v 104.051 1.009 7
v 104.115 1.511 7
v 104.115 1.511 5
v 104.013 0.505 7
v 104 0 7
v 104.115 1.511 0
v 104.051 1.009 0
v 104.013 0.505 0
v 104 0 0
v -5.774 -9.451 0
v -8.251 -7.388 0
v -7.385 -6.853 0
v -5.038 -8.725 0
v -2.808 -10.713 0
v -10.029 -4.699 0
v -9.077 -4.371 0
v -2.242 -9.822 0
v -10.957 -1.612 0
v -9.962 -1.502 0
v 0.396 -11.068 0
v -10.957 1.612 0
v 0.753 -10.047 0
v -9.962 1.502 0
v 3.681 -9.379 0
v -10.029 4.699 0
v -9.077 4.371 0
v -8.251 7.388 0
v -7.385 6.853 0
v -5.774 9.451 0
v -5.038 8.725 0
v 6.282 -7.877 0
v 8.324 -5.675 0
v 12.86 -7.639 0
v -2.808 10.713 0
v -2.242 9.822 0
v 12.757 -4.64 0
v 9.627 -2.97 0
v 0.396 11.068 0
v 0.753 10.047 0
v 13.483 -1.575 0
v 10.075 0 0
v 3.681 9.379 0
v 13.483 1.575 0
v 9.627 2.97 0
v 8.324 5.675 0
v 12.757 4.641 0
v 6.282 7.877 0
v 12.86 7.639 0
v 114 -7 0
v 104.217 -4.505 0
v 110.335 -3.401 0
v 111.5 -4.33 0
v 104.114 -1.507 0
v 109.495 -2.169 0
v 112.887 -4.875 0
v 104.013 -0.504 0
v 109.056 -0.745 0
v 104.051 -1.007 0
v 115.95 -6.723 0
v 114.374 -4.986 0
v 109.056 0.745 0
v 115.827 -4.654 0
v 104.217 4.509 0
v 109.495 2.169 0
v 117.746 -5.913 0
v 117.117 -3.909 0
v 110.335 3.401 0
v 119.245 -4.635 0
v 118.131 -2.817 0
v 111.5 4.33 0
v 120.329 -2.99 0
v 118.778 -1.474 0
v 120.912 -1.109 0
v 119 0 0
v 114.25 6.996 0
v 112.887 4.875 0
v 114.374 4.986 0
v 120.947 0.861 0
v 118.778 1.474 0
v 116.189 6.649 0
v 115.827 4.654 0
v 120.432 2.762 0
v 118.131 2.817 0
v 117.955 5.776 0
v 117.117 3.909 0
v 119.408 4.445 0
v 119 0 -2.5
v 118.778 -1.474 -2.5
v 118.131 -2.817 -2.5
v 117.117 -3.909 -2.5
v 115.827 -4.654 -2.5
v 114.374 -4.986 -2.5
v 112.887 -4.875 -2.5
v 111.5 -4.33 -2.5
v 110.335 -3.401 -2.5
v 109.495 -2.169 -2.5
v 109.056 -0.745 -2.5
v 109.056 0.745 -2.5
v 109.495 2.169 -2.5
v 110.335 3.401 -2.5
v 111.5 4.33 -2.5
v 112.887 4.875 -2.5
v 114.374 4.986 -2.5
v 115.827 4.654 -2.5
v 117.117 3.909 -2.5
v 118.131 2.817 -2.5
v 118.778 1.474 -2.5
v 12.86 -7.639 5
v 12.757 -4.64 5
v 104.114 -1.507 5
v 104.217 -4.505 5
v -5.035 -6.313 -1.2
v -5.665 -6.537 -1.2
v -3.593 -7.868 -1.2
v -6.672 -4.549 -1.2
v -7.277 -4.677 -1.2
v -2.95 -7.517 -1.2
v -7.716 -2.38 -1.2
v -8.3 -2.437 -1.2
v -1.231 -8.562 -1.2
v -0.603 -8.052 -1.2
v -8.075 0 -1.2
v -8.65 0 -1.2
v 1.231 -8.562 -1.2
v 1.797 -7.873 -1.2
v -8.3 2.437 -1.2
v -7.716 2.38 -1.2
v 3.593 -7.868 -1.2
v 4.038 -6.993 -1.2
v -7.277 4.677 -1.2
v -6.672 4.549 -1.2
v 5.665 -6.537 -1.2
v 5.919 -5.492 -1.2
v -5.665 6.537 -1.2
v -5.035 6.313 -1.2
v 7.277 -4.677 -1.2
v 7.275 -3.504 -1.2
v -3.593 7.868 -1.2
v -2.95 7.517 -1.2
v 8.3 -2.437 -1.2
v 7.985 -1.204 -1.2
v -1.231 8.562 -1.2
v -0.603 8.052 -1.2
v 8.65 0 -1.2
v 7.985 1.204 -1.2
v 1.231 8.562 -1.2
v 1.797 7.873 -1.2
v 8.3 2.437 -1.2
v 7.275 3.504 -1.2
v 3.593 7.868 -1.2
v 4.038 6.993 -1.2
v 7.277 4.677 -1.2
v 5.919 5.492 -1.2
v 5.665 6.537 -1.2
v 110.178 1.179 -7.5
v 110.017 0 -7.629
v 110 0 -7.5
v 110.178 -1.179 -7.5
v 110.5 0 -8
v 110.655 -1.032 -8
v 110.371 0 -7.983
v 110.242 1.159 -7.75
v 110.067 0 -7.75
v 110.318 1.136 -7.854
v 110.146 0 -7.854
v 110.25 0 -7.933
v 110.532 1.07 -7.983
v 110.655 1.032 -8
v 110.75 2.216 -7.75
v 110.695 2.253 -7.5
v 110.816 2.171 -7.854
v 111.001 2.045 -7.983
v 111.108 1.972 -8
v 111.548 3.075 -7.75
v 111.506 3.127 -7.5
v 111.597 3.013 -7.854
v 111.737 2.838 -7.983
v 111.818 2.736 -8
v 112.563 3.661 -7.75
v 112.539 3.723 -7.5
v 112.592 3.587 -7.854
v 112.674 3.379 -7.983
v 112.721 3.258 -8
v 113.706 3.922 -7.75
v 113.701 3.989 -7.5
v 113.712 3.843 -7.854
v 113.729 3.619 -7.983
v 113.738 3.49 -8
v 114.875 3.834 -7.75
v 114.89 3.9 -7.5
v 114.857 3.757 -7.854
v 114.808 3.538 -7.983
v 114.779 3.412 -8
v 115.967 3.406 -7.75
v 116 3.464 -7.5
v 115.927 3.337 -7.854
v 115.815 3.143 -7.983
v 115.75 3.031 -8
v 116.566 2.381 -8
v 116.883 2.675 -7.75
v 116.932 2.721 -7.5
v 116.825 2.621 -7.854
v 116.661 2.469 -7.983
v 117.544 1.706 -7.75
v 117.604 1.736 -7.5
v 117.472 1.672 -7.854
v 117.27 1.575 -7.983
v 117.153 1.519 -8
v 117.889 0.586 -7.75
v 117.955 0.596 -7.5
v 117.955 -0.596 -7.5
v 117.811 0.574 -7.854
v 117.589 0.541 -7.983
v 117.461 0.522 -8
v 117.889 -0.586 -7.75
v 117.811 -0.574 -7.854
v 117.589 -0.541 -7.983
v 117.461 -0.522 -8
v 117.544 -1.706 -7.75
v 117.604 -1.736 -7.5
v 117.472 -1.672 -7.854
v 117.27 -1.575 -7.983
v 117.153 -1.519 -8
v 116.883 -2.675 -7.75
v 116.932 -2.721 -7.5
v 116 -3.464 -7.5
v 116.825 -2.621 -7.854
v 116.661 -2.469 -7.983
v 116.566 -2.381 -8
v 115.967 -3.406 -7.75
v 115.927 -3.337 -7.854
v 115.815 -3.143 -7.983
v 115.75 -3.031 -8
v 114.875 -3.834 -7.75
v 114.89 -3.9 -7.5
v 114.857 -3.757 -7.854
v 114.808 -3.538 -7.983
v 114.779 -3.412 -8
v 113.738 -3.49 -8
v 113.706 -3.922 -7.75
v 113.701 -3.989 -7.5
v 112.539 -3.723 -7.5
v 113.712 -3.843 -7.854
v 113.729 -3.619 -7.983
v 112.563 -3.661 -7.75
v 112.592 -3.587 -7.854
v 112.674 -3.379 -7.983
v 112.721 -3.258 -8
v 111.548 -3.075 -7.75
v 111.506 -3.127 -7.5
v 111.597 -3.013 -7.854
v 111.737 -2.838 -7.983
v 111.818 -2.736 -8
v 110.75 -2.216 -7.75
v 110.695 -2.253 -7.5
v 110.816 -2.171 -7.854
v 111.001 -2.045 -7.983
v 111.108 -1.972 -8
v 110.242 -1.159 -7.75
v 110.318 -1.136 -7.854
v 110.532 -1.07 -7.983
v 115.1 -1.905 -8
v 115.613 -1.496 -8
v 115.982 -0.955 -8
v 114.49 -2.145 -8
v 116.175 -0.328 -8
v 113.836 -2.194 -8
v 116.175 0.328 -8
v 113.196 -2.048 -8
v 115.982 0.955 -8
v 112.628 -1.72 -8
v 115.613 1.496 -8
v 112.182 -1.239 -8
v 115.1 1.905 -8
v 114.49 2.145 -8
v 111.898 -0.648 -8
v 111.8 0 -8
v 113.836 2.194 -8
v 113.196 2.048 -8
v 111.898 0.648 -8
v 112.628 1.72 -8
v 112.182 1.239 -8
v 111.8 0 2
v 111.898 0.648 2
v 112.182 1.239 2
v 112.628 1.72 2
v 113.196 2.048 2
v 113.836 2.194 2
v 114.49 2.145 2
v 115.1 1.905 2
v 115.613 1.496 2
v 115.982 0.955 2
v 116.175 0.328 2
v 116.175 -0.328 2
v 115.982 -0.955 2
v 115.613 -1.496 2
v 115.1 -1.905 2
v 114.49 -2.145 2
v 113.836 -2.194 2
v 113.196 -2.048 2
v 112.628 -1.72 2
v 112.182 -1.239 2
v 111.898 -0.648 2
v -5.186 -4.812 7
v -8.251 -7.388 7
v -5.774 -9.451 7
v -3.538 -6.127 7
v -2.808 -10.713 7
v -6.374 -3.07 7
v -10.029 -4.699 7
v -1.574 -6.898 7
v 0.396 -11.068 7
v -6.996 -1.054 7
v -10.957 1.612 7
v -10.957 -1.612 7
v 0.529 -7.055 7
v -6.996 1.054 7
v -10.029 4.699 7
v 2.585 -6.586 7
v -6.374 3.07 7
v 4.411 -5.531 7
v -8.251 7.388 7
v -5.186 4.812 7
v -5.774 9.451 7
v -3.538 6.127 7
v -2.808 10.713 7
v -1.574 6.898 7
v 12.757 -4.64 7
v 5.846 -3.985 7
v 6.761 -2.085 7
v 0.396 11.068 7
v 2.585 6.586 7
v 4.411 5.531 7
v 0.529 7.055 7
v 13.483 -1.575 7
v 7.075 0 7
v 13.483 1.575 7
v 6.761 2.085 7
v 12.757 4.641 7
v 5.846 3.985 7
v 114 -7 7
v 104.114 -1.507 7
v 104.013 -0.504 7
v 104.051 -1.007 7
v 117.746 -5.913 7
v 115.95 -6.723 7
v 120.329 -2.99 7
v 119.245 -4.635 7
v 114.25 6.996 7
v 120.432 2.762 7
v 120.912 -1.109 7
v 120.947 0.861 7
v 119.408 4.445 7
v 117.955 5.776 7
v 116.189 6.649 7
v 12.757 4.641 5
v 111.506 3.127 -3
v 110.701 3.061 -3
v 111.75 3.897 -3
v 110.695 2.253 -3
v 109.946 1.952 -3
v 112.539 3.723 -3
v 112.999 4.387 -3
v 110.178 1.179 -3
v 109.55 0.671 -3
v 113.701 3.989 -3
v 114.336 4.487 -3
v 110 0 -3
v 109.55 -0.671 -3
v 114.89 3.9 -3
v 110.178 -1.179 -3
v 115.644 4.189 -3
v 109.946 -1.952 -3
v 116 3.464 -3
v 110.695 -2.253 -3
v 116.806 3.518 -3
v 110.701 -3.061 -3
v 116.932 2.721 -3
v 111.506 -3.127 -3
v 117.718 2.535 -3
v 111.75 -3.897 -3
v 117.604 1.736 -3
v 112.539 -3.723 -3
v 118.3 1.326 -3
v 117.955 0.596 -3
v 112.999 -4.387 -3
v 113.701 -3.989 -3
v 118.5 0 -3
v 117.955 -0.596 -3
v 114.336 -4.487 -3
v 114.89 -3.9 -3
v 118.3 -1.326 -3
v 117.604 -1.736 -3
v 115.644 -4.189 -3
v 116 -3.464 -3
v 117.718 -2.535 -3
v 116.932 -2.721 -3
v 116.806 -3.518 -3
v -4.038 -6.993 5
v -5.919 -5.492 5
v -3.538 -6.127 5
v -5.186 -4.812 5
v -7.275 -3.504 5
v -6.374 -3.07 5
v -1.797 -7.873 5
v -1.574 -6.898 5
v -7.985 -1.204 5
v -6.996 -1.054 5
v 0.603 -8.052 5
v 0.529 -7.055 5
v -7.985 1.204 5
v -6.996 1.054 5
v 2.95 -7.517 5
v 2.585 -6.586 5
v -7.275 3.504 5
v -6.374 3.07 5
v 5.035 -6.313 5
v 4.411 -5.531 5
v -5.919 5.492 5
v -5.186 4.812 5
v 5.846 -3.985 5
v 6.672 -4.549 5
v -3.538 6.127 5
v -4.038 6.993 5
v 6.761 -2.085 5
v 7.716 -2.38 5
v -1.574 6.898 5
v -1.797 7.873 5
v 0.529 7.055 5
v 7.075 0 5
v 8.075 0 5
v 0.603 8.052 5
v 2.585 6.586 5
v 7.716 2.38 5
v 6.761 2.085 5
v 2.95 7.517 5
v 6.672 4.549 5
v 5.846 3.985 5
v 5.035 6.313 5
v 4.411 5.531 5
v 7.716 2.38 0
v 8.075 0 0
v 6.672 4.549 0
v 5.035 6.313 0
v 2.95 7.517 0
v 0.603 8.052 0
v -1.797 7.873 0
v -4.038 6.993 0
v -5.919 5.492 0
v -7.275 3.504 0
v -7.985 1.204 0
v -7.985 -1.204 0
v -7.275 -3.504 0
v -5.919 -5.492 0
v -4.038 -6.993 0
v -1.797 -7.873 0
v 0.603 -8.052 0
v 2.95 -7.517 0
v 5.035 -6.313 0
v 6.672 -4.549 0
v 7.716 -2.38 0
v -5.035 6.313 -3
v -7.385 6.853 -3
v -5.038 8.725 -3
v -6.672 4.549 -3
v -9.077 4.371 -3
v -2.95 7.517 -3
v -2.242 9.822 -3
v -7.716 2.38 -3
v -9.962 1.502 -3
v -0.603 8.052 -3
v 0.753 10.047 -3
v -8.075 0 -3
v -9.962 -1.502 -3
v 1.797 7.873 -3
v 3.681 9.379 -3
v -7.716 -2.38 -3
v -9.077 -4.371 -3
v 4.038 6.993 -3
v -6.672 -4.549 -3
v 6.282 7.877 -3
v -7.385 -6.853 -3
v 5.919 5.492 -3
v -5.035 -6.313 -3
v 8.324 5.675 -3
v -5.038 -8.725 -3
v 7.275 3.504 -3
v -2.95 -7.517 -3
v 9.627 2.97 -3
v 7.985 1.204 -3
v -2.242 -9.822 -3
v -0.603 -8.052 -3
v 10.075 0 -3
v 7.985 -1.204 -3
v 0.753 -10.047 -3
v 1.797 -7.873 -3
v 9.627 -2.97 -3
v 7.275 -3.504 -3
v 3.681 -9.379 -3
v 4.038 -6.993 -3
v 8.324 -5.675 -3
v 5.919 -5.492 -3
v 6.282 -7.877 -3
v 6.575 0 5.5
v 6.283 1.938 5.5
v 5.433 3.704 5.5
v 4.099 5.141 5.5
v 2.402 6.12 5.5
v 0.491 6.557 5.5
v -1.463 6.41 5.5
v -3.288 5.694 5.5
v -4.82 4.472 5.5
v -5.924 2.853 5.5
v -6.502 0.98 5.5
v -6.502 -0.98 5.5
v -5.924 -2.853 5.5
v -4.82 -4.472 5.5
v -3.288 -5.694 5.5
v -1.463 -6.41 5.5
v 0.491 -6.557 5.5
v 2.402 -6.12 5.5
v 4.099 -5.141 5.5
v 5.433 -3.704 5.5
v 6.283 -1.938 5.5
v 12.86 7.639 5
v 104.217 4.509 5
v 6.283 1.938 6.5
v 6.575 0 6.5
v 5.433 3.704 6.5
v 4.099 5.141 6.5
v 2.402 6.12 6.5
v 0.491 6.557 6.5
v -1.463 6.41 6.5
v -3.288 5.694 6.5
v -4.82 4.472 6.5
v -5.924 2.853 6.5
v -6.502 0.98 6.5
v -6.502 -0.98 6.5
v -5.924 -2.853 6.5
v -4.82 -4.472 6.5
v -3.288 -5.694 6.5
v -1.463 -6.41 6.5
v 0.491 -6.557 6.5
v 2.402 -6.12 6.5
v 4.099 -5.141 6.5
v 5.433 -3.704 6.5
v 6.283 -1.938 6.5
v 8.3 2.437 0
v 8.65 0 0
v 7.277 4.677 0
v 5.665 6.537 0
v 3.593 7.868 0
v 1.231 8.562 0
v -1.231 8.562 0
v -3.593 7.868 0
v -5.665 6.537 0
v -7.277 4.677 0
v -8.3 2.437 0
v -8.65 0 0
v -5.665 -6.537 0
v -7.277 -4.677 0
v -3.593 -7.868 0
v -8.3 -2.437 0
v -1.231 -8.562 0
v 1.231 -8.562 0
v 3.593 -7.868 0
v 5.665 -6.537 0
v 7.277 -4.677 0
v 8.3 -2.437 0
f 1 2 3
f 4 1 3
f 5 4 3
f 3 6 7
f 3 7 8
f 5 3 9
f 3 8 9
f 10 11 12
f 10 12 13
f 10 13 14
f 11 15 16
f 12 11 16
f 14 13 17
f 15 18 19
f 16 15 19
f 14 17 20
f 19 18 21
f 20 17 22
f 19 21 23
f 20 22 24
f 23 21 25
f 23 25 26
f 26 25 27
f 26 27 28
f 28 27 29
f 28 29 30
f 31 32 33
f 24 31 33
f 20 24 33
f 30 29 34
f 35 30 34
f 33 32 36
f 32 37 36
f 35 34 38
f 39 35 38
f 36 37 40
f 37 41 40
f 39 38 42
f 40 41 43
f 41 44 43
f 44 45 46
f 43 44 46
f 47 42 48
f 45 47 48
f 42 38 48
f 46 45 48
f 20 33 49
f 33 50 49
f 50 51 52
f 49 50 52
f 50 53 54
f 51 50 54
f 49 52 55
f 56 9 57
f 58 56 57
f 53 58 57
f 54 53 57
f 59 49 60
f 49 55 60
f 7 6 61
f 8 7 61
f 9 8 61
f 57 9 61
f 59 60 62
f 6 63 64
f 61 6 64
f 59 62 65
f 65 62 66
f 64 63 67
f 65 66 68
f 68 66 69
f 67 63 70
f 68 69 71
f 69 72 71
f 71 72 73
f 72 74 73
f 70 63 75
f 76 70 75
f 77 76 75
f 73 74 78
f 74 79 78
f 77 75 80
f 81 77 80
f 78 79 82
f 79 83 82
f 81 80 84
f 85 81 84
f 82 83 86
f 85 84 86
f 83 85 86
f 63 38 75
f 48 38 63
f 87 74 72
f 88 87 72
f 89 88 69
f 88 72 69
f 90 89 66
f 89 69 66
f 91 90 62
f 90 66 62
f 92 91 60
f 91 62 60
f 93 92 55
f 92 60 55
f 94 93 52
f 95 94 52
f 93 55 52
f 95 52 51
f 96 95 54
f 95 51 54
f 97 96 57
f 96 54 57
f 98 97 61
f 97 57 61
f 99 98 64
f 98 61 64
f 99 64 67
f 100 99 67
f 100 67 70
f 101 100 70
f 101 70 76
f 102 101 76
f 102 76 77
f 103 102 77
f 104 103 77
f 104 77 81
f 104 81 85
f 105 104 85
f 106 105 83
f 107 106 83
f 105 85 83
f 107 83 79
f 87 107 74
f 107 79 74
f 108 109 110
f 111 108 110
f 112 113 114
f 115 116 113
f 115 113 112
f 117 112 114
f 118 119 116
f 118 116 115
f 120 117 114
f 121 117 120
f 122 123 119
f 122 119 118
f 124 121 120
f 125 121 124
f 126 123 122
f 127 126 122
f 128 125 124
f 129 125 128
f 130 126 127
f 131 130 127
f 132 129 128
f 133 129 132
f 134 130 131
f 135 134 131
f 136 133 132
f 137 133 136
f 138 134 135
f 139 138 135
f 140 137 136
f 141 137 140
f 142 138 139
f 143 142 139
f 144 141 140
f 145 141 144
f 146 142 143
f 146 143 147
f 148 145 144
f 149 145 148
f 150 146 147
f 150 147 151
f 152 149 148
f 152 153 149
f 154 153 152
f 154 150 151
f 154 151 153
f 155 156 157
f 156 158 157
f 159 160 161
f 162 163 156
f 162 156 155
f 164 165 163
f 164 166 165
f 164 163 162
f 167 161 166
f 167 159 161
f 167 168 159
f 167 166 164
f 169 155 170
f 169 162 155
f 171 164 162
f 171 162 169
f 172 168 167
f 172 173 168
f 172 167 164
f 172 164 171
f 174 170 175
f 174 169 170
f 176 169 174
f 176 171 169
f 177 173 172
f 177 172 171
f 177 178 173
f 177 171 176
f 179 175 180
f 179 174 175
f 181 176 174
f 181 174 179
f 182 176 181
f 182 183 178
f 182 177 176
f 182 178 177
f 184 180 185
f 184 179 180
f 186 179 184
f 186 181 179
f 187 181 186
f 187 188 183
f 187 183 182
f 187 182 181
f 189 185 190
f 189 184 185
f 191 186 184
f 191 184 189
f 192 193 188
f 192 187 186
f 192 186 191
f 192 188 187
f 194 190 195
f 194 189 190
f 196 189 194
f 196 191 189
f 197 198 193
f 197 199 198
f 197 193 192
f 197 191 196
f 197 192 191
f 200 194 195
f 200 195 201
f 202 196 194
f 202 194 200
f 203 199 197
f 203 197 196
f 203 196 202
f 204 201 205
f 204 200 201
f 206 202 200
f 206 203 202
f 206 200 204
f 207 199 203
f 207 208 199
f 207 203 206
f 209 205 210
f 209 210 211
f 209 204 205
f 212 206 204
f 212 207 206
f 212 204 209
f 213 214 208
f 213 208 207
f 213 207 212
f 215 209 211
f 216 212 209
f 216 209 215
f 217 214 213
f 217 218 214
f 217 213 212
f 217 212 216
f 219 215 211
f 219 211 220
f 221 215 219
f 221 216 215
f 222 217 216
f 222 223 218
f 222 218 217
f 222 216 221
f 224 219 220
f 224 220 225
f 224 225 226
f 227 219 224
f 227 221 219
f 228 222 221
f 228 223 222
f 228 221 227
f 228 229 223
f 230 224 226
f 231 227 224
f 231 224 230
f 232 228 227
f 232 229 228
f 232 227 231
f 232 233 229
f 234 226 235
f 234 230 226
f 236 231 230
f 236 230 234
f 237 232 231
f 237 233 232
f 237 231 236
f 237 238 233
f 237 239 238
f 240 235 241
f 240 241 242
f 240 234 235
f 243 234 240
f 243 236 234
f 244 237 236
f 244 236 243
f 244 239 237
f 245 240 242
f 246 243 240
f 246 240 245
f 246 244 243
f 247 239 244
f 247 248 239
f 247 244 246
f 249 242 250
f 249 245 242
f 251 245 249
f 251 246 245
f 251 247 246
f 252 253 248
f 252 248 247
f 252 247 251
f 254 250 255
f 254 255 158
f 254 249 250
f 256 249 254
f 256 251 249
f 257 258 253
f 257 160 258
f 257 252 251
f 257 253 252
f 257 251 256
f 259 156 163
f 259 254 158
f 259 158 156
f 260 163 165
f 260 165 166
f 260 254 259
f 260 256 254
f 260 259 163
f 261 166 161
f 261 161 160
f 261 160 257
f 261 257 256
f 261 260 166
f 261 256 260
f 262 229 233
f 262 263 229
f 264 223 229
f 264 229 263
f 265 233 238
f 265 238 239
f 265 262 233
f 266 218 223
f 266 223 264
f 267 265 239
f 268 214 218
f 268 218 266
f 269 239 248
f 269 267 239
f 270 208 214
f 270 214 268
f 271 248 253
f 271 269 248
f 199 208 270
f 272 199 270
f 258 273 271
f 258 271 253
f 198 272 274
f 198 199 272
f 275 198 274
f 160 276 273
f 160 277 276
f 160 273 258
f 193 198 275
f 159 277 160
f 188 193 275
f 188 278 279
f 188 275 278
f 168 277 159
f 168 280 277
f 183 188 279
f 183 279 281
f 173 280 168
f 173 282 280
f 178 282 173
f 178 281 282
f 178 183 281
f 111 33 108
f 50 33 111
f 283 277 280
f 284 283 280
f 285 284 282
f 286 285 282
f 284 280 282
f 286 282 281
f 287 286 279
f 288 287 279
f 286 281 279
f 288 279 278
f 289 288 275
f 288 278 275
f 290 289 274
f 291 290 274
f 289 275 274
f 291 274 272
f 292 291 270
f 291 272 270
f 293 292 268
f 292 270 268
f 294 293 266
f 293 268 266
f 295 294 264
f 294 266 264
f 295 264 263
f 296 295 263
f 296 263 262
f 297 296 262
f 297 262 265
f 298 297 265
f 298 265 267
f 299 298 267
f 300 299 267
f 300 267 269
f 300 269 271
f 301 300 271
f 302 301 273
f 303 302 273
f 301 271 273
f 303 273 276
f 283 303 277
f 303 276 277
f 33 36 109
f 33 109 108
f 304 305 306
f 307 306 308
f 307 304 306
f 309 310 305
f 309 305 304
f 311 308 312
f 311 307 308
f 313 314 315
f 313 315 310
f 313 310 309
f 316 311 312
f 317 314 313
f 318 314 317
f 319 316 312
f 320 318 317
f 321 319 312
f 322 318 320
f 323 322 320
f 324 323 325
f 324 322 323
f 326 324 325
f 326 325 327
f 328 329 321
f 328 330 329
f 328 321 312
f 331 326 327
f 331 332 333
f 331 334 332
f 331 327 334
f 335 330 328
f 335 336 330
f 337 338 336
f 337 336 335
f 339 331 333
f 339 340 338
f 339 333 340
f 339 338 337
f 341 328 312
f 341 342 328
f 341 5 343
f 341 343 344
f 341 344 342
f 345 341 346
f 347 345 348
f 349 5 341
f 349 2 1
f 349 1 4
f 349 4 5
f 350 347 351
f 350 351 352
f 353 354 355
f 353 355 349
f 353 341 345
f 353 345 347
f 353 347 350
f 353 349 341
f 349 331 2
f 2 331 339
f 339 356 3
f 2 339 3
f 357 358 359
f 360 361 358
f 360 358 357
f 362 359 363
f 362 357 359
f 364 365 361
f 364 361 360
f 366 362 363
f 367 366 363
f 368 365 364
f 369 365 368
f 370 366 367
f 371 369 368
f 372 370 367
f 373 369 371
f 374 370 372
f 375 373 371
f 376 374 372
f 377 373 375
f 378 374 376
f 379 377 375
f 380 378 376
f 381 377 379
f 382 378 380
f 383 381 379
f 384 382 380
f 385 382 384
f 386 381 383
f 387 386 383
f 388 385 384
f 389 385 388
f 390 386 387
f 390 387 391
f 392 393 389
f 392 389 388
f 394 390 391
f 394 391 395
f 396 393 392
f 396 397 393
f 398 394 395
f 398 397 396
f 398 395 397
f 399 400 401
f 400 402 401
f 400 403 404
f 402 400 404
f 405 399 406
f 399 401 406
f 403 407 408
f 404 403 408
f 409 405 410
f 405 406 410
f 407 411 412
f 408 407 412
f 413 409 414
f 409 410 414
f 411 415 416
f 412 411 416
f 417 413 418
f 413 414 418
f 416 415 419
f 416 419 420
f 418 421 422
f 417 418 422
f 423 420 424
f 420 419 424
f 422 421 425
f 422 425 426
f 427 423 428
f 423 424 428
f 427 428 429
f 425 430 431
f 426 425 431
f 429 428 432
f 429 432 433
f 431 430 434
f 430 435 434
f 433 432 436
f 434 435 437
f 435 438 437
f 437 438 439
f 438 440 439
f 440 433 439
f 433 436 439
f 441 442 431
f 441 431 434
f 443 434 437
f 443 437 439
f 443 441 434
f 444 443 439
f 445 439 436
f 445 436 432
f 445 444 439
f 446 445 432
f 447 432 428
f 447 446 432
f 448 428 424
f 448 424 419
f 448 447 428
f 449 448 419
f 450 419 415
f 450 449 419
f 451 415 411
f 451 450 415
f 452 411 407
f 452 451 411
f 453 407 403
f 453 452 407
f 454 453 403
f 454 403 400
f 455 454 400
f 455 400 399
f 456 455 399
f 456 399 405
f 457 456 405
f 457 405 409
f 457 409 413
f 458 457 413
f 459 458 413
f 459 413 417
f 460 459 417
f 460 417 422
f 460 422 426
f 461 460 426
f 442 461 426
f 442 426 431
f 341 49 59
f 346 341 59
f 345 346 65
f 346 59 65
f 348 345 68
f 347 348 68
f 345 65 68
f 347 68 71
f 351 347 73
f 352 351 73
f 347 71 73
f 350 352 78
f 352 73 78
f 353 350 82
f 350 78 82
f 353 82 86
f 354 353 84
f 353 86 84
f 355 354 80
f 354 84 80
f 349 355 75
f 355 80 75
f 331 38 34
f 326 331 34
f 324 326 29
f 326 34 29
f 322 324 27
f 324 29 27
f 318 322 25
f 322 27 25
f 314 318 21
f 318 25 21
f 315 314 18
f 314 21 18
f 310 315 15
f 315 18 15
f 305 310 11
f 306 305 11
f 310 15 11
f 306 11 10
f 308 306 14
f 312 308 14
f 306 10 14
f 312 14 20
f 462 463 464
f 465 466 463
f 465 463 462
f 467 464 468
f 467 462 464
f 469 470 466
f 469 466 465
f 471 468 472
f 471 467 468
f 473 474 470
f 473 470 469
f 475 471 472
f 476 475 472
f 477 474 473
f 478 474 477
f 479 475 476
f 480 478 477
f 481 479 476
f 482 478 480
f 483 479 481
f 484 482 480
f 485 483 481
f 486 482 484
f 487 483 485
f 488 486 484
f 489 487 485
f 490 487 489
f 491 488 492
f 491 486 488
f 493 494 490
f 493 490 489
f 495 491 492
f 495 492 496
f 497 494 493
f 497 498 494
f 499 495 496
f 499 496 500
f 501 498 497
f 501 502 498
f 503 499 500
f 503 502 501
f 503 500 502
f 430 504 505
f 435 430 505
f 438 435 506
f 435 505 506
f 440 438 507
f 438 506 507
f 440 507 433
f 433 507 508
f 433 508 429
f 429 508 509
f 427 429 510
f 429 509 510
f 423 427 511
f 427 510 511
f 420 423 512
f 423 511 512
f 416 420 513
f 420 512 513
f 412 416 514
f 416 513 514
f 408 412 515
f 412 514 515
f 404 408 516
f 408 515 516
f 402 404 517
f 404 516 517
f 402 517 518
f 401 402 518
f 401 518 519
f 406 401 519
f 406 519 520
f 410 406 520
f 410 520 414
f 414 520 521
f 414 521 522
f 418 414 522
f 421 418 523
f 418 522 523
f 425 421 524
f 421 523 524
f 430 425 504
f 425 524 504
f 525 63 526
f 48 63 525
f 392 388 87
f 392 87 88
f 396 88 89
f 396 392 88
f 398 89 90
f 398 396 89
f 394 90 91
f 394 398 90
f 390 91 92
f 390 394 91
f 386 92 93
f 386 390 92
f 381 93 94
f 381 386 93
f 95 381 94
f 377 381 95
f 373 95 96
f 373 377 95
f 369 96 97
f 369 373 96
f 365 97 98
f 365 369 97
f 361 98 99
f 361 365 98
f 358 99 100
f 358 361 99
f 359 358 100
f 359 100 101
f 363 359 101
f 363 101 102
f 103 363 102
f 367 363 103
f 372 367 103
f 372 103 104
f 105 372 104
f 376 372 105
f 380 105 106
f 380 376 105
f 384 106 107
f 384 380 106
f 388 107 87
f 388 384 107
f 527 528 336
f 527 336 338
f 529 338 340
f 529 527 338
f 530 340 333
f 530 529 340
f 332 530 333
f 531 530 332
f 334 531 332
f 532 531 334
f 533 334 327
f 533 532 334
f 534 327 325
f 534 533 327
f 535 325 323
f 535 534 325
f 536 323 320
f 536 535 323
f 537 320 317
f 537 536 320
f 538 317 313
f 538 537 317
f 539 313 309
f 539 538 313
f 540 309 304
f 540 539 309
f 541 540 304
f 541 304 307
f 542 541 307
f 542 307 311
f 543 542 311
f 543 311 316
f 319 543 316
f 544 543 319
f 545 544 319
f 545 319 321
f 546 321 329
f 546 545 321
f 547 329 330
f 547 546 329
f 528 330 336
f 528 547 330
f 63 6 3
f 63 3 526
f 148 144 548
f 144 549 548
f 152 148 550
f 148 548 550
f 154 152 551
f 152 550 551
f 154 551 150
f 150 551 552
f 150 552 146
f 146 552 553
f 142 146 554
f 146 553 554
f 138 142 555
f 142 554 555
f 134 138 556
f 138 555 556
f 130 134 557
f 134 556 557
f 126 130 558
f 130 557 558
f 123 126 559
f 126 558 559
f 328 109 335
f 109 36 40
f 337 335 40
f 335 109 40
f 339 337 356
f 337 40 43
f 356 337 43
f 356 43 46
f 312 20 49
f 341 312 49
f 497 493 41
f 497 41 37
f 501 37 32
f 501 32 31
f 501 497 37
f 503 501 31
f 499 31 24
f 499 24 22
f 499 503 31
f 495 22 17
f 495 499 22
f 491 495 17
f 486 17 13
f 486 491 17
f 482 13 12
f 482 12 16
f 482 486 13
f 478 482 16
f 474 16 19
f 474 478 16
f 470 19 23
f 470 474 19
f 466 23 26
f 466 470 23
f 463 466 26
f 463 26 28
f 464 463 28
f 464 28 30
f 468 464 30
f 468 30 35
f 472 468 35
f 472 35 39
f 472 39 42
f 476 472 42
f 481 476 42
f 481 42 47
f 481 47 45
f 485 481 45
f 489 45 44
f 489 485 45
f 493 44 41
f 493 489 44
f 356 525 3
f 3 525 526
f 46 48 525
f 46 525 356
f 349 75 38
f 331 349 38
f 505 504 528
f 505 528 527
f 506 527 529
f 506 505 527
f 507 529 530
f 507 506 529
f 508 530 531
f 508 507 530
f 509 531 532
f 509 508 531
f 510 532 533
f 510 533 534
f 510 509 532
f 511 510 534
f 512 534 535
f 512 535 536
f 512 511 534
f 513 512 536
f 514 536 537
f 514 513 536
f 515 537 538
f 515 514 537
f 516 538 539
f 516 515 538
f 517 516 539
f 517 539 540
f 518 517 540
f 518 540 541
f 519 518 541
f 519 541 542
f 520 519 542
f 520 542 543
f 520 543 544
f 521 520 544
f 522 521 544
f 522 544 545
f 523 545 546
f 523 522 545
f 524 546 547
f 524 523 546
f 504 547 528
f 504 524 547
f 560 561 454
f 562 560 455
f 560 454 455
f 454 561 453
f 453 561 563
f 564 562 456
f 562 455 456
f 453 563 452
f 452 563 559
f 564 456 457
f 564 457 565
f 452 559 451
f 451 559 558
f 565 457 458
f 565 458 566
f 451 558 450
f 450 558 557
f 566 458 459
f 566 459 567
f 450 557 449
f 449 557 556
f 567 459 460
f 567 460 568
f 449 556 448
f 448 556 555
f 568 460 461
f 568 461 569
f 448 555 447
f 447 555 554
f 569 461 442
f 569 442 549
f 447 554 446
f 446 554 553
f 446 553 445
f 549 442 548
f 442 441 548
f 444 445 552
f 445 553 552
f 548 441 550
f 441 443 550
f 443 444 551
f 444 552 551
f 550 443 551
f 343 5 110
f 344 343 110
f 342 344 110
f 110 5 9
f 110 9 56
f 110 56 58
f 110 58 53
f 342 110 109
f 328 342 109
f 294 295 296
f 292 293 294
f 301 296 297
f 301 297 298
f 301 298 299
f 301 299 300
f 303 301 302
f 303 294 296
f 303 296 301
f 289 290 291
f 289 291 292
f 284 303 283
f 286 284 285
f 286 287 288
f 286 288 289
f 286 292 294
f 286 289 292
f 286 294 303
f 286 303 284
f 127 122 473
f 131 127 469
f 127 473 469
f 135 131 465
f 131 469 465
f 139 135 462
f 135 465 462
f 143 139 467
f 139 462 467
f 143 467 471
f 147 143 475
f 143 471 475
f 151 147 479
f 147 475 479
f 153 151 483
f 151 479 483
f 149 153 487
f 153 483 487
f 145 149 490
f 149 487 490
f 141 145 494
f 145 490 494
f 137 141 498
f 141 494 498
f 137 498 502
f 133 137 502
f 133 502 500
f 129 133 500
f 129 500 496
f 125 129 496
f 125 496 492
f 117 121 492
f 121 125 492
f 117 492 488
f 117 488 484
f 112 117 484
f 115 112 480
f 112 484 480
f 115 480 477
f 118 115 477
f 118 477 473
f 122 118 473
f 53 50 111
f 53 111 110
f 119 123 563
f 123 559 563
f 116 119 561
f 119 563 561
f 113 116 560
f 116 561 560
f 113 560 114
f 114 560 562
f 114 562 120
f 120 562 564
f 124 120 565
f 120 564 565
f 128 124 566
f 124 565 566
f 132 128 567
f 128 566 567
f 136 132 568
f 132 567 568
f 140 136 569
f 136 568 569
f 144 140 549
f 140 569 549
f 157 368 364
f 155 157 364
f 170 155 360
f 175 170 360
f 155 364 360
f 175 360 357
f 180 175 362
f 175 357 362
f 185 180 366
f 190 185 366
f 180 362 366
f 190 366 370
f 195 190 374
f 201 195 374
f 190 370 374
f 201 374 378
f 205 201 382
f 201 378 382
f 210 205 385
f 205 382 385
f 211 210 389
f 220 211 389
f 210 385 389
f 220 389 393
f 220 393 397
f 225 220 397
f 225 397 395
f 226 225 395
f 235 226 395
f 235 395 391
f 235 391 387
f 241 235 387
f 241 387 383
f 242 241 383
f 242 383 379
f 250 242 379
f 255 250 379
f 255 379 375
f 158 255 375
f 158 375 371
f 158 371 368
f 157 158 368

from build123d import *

# Parameters (mm, degrees)
SKETCH_1_R          = 8.075
EXTRUDE_1_DEPTH     = 7
EXTRUDE_START       = -2
SKETCH_2_R          = 8.075
SKETCH_2_R_2        = 6.575
EXTRUDE_2_DEPTH     = 2
SKETCH_3_R          = 4
EXTRUDE_3_DEPTH     = 10
SKETCH_4_R          = 5
SKETCH_4_R_2        = 4
EXTRUDE_4_DEPTH     = 3
CHAMFER_1_SIZE      = 0.5
CUT_EXTRUDE_1_DEPTH = 7
CUT_EXTRUDE_2_DEPTH = 5
CUT_EXTRUDE_START   = -2
SKETCH_8_R          = 4
CUT_EXTRUDE_3_DEPTH = 2
FILLET_1_R          = 0.5
SKETCH_9_R          = 2.2
CUT_EXTRUDE_4_DEPTH = 10
EXTRUDE_START_2     = 3
SKETCH_10_R         = 10.075
SKETCH_10_R_2       = 8.075
EXTRUDE_5_DEPTH     = 3


with BuildPart() as part:
    # 草图1 → 凸台-拉伸1 (new body)
    with BuildSketch(Plane.XY):
        with BuildLine():
            ThreePointArc((0.395882675, 11.067922204), (-11.074999998, -0.000217919), (0.396318234, -11.067906616))
            Line((0.396318234, -11.067906616), (114, -7))
            ThreePointArc((114, -7), (120.998881523, -0.125129643), (114.250219298, 6.995526449))
            Line((114.250219298, 6.995526449), (0.395882675, 11.067922204))
        make_face()
        Circle(SKETCH_1_R, mode=Mode.SUBTRACT)
    extrude(amount=EXTRUDE_1_DEPTH)

    # 草图2 → 凸台-拉伸2 (add)
    with BuildSketch(Plane.XY.offset(7).offset(EXTRUDE_START)):
        Circle(SKETCH_2_R)
        Circle(SKETCH_2_R_2, mode=Mode.SUBTRACT)
    extrude(amount=EXTRUDE_2_DEPTH)

    # 草图3 → 凸台-拉伸3 (add)
    with BuildSketch(Plane(origin=(0, 0, 0), x_dir=(-1, 0, 0), z_dir=(0, 0, -1))):
        with Locations((-114, 0)):
            Circle(SKETCH_3_R)
    extrude(amount=EXTRUDE_3_DEPTH)

    # 草图4 → 凸台-拉伸4 (add)
    with BuildSketch(Plane(origin=(0, 0, 0), x_dir=(-1, 0, 0), z_dir=(0, 0, -1))):
        with Locations(Location((-114, 0, 0), (0, 0, 180))):
            Circle(SKETCH_4_R)
        with Locations((-114, 0)):
            Circle(SKETCH_4_R_2, mode=Mode.SUBTRACT)
    extrude(amount=EXTRUDE_4_DEPTH)

    # 倒角1
    chamfer_1_edges = [part.edges().sort_by_distance(p)[0] for p in [
        (-6.575, 0, 5),
        (-6.575, 0, 7),
        (118, 0, -10),
        (109, 0, -3),
    ]]
    chamfer(chamfer_1_edges, length=CHAMFER_1_SIZE)

    # 草图5 → 切除-拉伸1 (cut)
    with BuildSketch(Plane(origin=(0, 0, 0), x_dir=(-1, 0, 0), z_dir=(0, 0, -1))):
        with BuildLine():
            ThreePointArc((-12.757234161, -4.640431182), (-13.574999998, 0.000234775), (-12.757073645, 4.640872443))
            Line((-12.757073645, 4.640872443), (-104.114755838, 1.510611753))
            ThreePointArc((-104.114755838, 1.510611753), (-104.028730231, 0.75748214), (-104, 0))
            ThreePointArc((-104, 0), (-104.028593207, -0.755676237), (-104.114209315, -1.507031033))
            Line((-104.114209315, -1.507031033), (-12.757234161, -4.640431182))
        make_face()
    extrude(amount=-CUT_EXTRUDE_1_DEPTH, mode=Mode.SUBTRACT)

    # 草图6 → 切除-拉伸2 (cut)
    with BuildSketch(Plane(origin=(0, 0, 0), x_dir=(-1, 0, 0), z_dir=(0, 0, -1))):
        Polygon((-104.114209315, -1.507031033), (-12.757234161, -4.640431182), (-12.860068961, -7.638668165), (-104.217044114, -4.505268015), align=None)
        Polygon((-12.757073645, 4.640872443), (-104.114755838, 1.510611753), (-104.217486931, 4.508852291), (-12.859804737, 7.63911298), align=None)
    extrude(amount=-CUT_EXTRUDE_2_DEPTH, mode=Mode.SUBTRACT)

    # 草图8 → 切除-拉伸3 (cut)
    with BuildSketch(Plane(origin=(0, 0, -10), x_dir=(-1, 0, 0), z_dir=(0, 0, -1)).offset(CUT_EXTRUDE_START)):
        with Locations((-114, 0)):
            Circle(SKETCH_8_R)
    extrude(amount=CUT_EXTRUDE_3_DEPTH, mode=Mode.SUBTRACT)

    # 圆角1
    fillet_1_edges = [part.edges().sort_by_distance(p)[0] for p in [
        (118, 0, -8),
    ]]
    fillet(fillet_1_edges, radius=FILLET_1_R)

    # 草图9 → 切除-拉伸4 (cut)
    with BuildSketch(Plane(origin=(0, 0, -8), x_dir=(-1, 0, 0), z_dir=(0, 0, -1))):
        with Locations((-114, 0)):
            Circle(SKETCH_9_R)
    extrude(amount=-CUT_EXTRUDE_4_DEPTH, mode=Mode.SUBTRACT)

    # 草图10 → 凸台-拉伸5 (add)
    with BuildSketch(Plane(origin=(0, 0, 0), x_dir=(-1, 0, 0), z_dir=(0, 0, -1)).offset(EXTRUDE_START_2)):
        with Locations(Location((0, 0, 0), (0, 0, 180))):
            Circle(SKETCH_10_R)
        Circle(SKETCH_10_R_2, mode=Mode.SUBTRACT)
    extrude(amount=-EXTRUDE_5_DEPTH)

    # 切除-旋转2: read off the stored shape, not the designer's step
    # 切除-旋转2: loft between two sections, ruled curve by curve
    cut_revolve_2_from = [
        Edge.make_three_point_arc((8.65, 0, -1.2), (0, 8.65, -1.2), (-8.65, 0, -1.2)),
        Edge.make_three_point_arc((-8.65, 0, -1.2), (0, -8.65, -1.2), (8.65, 0, -1.2)),
    ]
    cut_revolve_2_to = [
        Edge.make_three_point_arc((8.65, 0, 0), (0, 8.65, 0), (-8.65, 0, 0)),
        Edge.make_three_point_arc((-8.65, 0, 0), (0, -8.65, 0), (8.65, 0, 0)),
    ]
    cut_revolve_2 = Solid(Shell([*[Face.make_surface_from_curves(cut_revolve_2_from[k], cut_revolve_2_to[k]) for k in range(2)], Face(Wire(cut_revolve_2_from)), Face(Wire(cut_revolve_2_to))]))
    add(cut_revolve_2, mode=Mode.SUBTRACT)


solid = part.part
